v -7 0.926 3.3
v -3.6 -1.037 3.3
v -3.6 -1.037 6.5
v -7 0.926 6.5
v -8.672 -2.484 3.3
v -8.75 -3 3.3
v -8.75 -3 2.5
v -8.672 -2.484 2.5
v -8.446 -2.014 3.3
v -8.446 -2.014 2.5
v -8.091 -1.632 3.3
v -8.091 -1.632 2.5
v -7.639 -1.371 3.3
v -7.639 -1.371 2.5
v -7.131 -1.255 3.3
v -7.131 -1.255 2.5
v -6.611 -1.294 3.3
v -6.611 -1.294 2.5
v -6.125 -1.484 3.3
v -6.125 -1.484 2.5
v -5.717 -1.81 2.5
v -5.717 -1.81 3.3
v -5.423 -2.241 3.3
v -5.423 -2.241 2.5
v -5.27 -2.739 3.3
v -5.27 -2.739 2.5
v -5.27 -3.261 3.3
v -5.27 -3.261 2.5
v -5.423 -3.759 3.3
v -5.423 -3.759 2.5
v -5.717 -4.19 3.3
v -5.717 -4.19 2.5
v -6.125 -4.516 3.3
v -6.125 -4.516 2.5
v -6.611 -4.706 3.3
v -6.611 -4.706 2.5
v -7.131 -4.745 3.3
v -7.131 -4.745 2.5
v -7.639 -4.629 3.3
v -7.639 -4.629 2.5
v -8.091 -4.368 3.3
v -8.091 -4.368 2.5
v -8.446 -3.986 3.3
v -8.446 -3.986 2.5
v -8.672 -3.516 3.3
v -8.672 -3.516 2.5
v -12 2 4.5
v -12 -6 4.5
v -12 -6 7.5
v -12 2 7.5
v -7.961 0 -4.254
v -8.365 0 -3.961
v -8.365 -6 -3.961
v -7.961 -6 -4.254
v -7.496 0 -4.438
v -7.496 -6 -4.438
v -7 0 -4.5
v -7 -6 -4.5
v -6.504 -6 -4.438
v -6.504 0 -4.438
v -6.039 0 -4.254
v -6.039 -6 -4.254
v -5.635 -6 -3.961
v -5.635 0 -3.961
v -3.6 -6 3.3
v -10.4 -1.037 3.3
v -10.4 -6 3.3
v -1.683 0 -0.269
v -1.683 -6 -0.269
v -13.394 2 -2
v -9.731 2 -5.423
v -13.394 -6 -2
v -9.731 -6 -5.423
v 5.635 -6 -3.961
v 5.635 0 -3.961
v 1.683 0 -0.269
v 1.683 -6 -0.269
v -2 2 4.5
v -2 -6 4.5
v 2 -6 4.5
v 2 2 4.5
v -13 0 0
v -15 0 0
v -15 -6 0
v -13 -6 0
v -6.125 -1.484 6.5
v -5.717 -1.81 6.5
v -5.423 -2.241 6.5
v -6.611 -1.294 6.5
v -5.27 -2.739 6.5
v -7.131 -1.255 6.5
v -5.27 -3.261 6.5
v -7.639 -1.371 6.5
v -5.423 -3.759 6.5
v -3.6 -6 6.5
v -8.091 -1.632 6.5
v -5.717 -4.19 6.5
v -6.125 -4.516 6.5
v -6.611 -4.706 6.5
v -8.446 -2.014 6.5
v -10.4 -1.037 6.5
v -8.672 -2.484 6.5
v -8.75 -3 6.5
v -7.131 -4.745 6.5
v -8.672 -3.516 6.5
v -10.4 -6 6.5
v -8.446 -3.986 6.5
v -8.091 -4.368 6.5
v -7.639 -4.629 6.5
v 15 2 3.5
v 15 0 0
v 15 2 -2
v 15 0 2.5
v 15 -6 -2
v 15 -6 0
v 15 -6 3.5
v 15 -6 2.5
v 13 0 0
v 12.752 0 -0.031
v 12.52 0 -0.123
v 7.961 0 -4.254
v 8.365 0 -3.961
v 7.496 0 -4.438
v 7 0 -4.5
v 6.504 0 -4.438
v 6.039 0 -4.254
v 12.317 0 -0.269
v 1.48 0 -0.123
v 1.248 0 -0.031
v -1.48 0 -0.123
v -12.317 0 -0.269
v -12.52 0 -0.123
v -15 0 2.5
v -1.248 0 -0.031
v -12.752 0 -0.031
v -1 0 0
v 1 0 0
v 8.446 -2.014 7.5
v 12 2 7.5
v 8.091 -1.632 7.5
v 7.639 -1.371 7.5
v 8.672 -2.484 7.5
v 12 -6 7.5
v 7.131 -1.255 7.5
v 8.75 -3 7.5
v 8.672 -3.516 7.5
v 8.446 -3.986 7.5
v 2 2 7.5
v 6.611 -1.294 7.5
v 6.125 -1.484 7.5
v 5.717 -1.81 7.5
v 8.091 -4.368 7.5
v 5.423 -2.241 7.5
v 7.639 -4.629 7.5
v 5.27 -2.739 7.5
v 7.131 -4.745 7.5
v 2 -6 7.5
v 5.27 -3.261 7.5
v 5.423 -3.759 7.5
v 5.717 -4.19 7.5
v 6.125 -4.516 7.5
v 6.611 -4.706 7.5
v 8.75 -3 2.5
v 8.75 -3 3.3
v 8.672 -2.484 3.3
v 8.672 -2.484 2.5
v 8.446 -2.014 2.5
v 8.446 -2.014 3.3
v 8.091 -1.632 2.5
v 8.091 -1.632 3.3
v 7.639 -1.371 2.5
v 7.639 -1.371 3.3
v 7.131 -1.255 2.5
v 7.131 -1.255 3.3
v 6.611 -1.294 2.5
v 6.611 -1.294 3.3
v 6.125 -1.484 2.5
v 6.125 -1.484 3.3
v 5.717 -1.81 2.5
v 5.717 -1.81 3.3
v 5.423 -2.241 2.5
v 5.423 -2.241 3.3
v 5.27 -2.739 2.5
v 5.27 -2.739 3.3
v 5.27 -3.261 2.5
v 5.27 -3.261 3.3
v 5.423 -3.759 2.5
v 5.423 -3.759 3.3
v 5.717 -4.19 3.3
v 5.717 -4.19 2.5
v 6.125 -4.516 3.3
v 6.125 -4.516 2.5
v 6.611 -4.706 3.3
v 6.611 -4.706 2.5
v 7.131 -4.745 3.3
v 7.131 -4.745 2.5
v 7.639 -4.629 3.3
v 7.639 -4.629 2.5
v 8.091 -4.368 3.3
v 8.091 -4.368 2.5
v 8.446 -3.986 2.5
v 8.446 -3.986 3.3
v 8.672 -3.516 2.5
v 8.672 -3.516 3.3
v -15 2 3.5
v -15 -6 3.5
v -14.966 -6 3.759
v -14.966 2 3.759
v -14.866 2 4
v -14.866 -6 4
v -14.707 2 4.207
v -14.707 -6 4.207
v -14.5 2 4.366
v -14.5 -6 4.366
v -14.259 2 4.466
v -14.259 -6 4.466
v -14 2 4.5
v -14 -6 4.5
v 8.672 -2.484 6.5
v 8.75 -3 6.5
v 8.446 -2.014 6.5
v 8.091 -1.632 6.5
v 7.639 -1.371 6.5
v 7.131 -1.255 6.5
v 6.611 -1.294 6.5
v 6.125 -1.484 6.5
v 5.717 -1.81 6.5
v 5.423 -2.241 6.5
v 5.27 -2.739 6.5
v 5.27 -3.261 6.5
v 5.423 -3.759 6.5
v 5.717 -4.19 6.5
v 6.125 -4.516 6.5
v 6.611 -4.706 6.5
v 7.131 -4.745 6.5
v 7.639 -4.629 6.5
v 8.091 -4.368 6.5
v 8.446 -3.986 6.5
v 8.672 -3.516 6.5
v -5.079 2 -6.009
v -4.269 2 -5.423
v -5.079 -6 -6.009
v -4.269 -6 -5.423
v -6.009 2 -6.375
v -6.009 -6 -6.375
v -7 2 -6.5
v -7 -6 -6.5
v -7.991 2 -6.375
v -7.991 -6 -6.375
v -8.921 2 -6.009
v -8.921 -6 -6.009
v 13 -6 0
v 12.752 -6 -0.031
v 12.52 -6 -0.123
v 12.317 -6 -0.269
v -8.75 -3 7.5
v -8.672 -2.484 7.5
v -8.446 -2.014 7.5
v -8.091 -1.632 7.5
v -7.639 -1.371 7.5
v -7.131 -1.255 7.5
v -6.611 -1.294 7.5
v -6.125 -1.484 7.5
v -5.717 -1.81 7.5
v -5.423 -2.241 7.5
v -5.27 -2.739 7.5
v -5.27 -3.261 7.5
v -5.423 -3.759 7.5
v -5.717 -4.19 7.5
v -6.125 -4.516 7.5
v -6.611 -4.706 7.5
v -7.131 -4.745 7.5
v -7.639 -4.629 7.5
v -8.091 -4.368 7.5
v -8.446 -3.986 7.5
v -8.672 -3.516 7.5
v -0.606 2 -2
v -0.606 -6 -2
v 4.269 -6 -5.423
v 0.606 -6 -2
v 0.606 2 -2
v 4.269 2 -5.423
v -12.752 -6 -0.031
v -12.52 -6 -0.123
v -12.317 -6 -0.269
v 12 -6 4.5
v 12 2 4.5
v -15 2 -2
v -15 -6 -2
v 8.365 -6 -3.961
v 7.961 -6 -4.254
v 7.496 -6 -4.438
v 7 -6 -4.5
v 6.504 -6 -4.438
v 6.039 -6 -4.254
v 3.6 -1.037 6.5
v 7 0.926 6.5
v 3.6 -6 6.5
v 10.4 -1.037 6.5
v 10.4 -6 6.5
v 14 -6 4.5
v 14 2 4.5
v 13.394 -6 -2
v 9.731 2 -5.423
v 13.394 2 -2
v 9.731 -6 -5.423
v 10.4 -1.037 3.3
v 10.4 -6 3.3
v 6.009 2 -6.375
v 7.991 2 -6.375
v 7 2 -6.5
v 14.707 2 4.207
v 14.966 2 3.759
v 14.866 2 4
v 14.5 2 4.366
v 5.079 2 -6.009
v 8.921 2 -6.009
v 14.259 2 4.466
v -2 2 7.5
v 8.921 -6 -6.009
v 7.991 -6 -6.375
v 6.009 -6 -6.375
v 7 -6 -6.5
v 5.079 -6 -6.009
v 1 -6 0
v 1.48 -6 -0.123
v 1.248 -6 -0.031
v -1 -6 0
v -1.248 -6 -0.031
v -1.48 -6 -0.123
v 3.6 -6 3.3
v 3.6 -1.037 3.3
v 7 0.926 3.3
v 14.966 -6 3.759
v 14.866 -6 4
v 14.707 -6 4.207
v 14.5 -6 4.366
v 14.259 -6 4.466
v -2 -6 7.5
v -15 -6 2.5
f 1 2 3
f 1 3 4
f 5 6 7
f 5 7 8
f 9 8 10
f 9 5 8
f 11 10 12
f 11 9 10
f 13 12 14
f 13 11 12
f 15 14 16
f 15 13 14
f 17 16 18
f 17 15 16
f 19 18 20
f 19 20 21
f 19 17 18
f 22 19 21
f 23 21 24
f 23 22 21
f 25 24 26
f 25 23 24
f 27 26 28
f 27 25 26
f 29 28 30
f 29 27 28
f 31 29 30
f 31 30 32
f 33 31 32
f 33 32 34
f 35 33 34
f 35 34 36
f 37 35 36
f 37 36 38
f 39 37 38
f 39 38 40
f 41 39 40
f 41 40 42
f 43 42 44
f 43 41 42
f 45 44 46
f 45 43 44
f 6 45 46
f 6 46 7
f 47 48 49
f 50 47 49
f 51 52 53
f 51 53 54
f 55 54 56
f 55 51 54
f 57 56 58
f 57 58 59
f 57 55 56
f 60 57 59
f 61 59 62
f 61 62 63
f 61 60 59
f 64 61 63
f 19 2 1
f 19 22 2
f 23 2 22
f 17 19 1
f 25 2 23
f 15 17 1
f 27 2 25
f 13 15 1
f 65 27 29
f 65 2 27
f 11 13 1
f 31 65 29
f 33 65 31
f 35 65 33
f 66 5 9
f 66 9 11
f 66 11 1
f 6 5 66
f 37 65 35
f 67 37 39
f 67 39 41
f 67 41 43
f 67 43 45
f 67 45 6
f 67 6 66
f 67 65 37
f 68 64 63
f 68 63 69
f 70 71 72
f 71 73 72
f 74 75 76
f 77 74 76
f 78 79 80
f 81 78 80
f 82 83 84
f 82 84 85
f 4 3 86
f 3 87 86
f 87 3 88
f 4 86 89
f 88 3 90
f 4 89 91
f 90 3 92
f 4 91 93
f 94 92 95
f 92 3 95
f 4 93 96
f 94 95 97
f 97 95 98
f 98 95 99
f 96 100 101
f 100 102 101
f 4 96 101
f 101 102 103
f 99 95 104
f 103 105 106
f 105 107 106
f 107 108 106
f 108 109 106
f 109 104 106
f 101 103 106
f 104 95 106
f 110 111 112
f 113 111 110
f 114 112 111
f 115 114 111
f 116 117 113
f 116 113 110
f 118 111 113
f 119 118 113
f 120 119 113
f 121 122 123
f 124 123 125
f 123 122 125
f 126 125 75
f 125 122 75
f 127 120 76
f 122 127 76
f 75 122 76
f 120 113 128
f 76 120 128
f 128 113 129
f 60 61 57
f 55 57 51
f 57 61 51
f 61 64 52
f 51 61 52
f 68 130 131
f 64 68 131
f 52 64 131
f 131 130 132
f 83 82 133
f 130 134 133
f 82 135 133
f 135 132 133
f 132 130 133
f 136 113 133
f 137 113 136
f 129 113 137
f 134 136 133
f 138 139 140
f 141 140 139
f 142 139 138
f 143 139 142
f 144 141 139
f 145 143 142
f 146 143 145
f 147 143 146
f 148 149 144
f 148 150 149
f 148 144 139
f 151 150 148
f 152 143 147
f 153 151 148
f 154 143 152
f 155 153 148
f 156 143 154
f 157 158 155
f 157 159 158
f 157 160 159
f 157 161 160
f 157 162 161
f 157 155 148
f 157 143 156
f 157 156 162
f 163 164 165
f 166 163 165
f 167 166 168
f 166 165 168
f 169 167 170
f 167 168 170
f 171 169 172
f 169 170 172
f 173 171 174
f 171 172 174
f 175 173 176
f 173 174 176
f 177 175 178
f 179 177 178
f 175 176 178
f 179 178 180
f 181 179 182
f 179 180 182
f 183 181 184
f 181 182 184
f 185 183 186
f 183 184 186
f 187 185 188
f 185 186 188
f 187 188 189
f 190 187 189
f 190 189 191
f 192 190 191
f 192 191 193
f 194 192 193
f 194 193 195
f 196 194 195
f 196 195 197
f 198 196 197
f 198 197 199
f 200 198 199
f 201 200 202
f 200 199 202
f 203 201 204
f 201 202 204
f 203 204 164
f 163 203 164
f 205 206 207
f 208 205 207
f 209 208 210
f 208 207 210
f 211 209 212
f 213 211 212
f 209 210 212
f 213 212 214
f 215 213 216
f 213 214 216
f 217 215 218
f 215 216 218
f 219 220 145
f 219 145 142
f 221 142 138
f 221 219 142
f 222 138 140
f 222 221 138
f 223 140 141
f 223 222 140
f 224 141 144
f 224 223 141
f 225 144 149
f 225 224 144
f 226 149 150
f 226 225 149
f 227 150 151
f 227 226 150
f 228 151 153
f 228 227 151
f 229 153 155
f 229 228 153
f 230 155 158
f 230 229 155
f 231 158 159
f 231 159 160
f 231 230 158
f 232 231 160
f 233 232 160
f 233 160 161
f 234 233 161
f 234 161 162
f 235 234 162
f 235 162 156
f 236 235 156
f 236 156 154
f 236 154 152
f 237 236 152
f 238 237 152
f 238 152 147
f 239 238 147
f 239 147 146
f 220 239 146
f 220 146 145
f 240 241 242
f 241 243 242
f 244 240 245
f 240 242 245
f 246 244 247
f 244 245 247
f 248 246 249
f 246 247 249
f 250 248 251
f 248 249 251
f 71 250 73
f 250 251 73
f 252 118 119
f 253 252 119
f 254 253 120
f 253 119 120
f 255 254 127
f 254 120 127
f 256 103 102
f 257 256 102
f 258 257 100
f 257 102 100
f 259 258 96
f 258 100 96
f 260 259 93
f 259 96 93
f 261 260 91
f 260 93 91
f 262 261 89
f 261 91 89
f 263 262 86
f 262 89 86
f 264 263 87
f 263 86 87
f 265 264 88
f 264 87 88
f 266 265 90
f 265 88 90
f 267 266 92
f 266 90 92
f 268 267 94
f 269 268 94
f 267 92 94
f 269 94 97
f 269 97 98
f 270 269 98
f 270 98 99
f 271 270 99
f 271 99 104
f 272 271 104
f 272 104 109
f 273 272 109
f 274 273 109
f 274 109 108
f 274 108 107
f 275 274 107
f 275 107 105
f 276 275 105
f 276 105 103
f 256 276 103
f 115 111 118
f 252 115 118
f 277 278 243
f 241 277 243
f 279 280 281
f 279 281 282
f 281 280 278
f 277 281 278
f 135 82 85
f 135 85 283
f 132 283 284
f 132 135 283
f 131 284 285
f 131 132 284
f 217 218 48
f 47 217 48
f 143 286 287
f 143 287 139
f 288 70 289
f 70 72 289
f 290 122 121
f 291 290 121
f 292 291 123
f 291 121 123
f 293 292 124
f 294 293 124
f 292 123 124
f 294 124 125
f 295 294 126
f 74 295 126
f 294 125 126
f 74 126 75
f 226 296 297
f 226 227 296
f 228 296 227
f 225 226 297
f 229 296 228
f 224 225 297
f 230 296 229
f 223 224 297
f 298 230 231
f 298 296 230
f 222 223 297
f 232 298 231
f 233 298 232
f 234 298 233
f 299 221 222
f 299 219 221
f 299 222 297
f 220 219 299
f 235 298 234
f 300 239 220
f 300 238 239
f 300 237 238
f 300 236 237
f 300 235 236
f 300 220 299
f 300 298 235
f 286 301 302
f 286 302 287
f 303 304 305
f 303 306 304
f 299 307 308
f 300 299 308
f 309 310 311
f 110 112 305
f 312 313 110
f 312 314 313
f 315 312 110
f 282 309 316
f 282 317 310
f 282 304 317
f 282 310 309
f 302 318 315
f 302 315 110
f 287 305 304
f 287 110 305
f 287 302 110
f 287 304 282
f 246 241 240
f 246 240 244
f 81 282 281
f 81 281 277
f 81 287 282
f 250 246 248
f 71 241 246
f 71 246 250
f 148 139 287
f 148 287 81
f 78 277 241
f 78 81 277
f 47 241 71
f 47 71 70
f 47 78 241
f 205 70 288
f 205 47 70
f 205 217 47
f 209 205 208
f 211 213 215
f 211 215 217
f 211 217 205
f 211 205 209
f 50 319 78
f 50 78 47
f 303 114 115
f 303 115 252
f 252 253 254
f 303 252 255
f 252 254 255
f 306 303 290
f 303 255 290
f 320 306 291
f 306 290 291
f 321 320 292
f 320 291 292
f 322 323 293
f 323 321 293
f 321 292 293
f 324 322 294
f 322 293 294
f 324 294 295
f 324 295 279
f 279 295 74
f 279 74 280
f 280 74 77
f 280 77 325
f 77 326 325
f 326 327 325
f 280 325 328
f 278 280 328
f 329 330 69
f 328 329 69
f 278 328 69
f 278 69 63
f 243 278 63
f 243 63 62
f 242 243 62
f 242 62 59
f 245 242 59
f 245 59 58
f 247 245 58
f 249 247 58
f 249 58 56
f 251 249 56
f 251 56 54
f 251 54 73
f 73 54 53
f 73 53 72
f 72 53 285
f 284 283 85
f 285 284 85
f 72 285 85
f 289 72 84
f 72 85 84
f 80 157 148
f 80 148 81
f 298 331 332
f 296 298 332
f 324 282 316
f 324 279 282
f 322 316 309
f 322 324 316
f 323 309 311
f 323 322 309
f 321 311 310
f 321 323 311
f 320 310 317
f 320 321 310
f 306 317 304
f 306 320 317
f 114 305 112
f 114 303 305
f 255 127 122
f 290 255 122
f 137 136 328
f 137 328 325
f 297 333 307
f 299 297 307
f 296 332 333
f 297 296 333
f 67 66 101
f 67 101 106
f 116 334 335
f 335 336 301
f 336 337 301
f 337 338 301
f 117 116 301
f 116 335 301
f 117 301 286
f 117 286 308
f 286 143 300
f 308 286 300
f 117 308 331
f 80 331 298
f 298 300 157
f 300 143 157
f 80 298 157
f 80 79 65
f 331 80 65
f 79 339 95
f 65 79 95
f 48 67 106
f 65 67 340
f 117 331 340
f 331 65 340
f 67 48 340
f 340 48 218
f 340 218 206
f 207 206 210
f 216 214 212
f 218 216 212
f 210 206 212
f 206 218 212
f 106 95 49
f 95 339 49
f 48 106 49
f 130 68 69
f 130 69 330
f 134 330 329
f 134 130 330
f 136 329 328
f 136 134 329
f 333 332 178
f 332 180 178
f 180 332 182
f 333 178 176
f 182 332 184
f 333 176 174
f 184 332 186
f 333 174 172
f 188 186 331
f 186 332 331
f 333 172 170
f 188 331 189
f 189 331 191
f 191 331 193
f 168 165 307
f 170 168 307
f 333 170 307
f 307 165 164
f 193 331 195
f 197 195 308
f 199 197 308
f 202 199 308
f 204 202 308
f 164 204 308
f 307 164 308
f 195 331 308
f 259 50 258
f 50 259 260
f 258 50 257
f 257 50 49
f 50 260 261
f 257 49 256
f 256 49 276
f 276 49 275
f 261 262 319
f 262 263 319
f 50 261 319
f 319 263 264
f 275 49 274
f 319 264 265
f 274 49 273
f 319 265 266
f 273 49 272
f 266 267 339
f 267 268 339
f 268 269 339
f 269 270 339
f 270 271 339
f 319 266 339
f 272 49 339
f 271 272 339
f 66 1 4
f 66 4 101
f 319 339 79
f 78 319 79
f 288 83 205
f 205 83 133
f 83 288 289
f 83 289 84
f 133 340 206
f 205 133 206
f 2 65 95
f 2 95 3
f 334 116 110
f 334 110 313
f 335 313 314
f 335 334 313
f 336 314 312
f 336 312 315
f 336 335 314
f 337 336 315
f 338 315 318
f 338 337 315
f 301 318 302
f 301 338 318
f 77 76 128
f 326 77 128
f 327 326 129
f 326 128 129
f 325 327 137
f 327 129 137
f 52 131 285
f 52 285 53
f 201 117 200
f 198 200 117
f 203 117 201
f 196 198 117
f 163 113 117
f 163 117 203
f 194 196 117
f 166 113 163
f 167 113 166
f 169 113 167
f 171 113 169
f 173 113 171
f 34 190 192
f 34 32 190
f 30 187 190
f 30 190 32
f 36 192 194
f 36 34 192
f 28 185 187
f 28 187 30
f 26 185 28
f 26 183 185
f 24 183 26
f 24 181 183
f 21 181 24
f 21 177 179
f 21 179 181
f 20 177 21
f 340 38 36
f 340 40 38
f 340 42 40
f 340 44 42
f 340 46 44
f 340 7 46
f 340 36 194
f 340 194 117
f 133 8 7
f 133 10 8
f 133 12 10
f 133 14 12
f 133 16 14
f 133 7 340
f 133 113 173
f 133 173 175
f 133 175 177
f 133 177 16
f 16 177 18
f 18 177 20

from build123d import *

# Parameters (mm, degrees)
F1_DEPTH      = 6
F3_DEPTH      = 2
F6_DEPTH      = 3.2
F7_R          = 1.75
F8_DEPTH      = 4.2
F8_DEPTH_BACK = 0.8


with BuildPart() as f1:
    # F0 (on Front) → F1 (new body)
    with BuildSketch(Plane.XZ):
        with BuildLine():
            Line((15, 0), (13, 0))
            ThreePointArc((13, 0), (12.6330653649, -0.0697532727), (12.3173205132, -0.2692820528))
            Line((12.3173205132, -0.2692820528), (8.3653589736, -3.9614358943))
            ThreePointArc((8.3653589736, -3.9614358943), (7, -4.5), (5.6346410264, -3.9614358943))
            Line((5.6346410264, -3.9614358943), (1.6826794868, -0.2692820528))
            ThreePointArc((1.6826794868, -0.2692820528), (1.3669346351, -0.0697532727), (1, 0))
            Line((1, 0), (0, 0))
            Line((0, 0), (0, -2))
            Line((0, -2), (0.6055512755, -2))
            Line((0.6055512755, -2), (4.2692820528, -5.4228717887))
            ThreePointArc((4.2692820528, -5.4228717887), (7, -6.5), (9.7307179472, -5.4228717887))
            Line((9.7307179472, -5.4228717887), (13.3944487245, -2))
            Line((13.3944487245, -2), (15, -2))
            Line((15, -2), (15, 0))
        make_face()
    extrude(amount=F1_DEPTH)



with BuildPart() as f1b:
    # F0 (on Front) → F1, piece 2 (new body)
    with BuildSketch(Plane.XZ):
        with BuildLine():
            Line((0, 4.5), (0, 2.5))
            Line((0, 2.5), (1, 2.5))
            Line((1, 2.5), (13, 2.5))
            Line((13, 2.5), (15, 2.5))
            Line((15, 2.5), (15, 3.5))
            ThreePointArc((15, 3.5), (14.7071067812, 4.2071067812), (14, 4.5))
            Line((14, 4.5), (12, 4.5))
            Line((12, 4.5), (12, 7.5))
            Line((12, 7.5), (2, 7.5))
            Line((2, 7.5), (2, 4.5))
            Line((2, 4.5), (0, 4.5))
        make_face()
    extrude(amount=F1_DEPTH)


with BuildPart() as f1_1:
    add(f1.part)

    add(f1b.part)  # F3 merges F1b
    # F2 (on Front) → F3 (join)
    with BuildSketch(Plane.XZ):
        with BuildLine():
            Line((13.3944487245, -2), (15, -2))
            Line((15, -2), (15, 3.5))
            ThreePointArc((15, 3.5), (14.7071067812, 4.2071067812), (14, 4.5))
            Line((14, 4.5), (12, 4.5))
            Line((12, 4.5), (12, 7.5))
            Line((12, 7.5), (2, 7.5))
            Line((2, 7.5), (2, 4.5))
            Line((2, 4.5), (0, 4.5))
            Line((0, 4.5), (0, -2))
            Line((0, -2), (0.6055512755, -2))
            Line((0.6055512755, -2), (4.2692820528, -5.4228717887))
            ThreePointArc((4.2692820528, -5.4228717887), (7, -6.5), (9.7307179472, -5.4228717887))
            Line((9.7307179472, -5.4228717887), (13.3944487245, -2))
        make_face()
    extrude(amount=-F3_DEPTH)

    # F5 (on offset) → F6 (cut)
    with BuildSketch(Plane(origin=(0, 0, 3.3), x_dir=(1, 0, 0), z_dir=(0, 0, -1))):
        Polygon((7, -0.9259818305), (10.4, 1.0370090848), (10.4, 4.9629909152), (10.4, 11.3659846154), (3.6, 11.3659846154), (3.6, 4.9629909152), (3.6, 1.0370090848), align=None)
    extrude(amount=-F6_DEPTH, mode=Mode.SUBTRACT)

    # F7 (on face) → F8 (cut, two sides)
    with BuildSketch(Plane.XY.offset(3.3)) as f8_sk:
        with Locations((7, -3)):
            Circle(F7_R)
    extrude(amount=F8_DEPTH, mode=Mode.SUBTRACT)
    extrude(f8_sk.sketch, amount=-F8_DEPTH_BACK, mode=Mode.SUBTRACT)

    # F9: F1 across plane


with BuildPart() as f1_2:
    add(f1_1.part)
    add(f1_1.part.mirror(Plane.YZ))


solid = f1_2.part
